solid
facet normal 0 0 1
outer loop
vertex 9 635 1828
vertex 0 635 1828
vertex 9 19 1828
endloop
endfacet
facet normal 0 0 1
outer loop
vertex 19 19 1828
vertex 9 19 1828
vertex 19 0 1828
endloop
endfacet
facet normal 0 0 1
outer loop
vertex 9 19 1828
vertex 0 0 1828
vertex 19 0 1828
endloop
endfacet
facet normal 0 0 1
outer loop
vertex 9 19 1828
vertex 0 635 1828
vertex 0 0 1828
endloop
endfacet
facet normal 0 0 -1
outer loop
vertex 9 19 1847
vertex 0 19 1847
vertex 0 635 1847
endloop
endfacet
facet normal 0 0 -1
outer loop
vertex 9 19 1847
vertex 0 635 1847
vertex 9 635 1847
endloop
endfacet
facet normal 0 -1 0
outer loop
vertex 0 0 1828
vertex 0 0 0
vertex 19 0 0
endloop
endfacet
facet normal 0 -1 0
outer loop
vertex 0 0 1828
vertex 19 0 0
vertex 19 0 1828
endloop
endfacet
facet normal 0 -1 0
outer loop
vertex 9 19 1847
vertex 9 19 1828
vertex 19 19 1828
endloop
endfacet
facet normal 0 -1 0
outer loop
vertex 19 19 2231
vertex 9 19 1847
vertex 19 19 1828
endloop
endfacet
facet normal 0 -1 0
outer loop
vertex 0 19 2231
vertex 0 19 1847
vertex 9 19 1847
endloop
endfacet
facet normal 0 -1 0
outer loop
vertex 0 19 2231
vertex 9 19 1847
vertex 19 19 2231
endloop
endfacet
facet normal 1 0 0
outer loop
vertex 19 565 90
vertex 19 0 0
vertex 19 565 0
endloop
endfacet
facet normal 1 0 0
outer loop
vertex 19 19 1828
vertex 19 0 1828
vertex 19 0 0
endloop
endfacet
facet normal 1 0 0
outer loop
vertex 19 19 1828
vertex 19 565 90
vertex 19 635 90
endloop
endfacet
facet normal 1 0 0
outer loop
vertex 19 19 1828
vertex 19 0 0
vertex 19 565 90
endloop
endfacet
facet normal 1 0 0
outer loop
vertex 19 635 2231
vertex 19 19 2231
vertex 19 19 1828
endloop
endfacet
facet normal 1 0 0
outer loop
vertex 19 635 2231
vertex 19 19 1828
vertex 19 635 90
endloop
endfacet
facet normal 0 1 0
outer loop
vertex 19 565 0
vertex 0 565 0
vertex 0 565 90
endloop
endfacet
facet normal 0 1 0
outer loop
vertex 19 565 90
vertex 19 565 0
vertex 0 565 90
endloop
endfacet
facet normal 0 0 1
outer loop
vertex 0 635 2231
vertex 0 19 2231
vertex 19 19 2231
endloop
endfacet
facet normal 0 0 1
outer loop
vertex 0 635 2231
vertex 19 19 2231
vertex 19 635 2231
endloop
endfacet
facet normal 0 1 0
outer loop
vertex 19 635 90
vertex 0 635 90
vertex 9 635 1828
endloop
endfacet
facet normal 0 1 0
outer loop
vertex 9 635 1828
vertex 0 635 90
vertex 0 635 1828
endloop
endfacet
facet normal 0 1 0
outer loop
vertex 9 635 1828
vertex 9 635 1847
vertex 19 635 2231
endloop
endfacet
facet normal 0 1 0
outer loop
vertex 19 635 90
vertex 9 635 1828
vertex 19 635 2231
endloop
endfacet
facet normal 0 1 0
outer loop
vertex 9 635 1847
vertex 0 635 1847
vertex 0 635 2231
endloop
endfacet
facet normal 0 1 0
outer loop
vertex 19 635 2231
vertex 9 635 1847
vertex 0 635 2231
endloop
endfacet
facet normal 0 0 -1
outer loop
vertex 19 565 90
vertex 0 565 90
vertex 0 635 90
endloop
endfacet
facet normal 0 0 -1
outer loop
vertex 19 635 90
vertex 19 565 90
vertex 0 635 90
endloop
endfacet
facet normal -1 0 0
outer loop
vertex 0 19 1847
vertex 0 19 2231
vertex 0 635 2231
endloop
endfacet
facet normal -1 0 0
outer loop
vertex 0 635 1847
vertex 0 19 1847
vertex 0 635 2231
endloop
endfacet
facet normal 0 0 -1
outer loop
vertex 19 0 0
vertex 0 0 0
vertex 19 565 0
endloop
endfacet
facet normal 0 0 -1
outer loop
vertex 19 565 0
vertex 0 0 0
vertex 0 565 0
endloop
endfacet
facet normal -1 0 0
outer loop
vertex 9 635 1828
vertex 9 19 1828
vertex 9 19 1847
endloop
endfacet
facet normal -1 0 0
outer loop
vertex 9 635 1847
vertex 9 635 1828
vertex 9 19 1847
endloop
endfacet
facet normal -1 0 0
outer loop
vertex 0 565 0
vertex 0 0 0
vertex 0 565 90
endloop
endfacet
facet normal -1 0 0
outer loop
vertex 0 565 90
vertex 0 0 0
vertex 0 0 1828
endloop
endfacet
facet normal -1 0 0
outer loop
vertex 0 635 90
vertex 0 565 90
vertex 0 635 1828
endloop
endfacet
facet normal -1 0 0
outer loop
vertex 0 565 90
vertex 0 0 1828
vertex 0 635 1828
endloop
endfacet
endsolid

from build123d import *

# Parameters (mm, degrees)
F0_W     = 635
F0_H     = 2231
F1_DEPTH = 19
F2_W     = 9
F2_H     = 19
F3_DEPTH = 635.001
F4_W     = 70
F4_H     = 90
F5_DEPTH = 19.001
F6_W     = 19
F6_H     = 403
F7_DEPTH = 19.001


with BuildPart() as f1:
    # F0 (on Right) → F1 (new body)
    with BuildSketch(Plane.YZ):
        with Locations((317.5, 1115.5)):
            Rectangle(F0_W, F0_H)
    extrude(amount=F1_DEPTH)

    # F2 (on Front) → F3 (cut, through all)
    with BuildSketch(Plane.XZ):
        with Locations((4.5, 1837.5)):
            Rectangle(F2_W, F2_H)
    extrude(amount=-F3_DEPTH, mode=Mode.SUBTRACT)

    # F4 (on Right) → F5 (cut, through all)
    with BuildSketch(Plane.YZ):
        with Locations((600, 45)):
            Rectangle(F4_W, F4_H)
    extrude(amount=F5_DEPTH, mode=Mode.SUBTRACT)

    # F6 (on Right) → F7 (cut, through all)
    with BuildSketch(Plane.YZ):
        with Locations((9.5, 2029.5)):
            Rectangle(F6_W, F6_H)
    extrude(amount=F7_DEPTH, mode=Mode.SUBTRACT)


solid = f1.part
